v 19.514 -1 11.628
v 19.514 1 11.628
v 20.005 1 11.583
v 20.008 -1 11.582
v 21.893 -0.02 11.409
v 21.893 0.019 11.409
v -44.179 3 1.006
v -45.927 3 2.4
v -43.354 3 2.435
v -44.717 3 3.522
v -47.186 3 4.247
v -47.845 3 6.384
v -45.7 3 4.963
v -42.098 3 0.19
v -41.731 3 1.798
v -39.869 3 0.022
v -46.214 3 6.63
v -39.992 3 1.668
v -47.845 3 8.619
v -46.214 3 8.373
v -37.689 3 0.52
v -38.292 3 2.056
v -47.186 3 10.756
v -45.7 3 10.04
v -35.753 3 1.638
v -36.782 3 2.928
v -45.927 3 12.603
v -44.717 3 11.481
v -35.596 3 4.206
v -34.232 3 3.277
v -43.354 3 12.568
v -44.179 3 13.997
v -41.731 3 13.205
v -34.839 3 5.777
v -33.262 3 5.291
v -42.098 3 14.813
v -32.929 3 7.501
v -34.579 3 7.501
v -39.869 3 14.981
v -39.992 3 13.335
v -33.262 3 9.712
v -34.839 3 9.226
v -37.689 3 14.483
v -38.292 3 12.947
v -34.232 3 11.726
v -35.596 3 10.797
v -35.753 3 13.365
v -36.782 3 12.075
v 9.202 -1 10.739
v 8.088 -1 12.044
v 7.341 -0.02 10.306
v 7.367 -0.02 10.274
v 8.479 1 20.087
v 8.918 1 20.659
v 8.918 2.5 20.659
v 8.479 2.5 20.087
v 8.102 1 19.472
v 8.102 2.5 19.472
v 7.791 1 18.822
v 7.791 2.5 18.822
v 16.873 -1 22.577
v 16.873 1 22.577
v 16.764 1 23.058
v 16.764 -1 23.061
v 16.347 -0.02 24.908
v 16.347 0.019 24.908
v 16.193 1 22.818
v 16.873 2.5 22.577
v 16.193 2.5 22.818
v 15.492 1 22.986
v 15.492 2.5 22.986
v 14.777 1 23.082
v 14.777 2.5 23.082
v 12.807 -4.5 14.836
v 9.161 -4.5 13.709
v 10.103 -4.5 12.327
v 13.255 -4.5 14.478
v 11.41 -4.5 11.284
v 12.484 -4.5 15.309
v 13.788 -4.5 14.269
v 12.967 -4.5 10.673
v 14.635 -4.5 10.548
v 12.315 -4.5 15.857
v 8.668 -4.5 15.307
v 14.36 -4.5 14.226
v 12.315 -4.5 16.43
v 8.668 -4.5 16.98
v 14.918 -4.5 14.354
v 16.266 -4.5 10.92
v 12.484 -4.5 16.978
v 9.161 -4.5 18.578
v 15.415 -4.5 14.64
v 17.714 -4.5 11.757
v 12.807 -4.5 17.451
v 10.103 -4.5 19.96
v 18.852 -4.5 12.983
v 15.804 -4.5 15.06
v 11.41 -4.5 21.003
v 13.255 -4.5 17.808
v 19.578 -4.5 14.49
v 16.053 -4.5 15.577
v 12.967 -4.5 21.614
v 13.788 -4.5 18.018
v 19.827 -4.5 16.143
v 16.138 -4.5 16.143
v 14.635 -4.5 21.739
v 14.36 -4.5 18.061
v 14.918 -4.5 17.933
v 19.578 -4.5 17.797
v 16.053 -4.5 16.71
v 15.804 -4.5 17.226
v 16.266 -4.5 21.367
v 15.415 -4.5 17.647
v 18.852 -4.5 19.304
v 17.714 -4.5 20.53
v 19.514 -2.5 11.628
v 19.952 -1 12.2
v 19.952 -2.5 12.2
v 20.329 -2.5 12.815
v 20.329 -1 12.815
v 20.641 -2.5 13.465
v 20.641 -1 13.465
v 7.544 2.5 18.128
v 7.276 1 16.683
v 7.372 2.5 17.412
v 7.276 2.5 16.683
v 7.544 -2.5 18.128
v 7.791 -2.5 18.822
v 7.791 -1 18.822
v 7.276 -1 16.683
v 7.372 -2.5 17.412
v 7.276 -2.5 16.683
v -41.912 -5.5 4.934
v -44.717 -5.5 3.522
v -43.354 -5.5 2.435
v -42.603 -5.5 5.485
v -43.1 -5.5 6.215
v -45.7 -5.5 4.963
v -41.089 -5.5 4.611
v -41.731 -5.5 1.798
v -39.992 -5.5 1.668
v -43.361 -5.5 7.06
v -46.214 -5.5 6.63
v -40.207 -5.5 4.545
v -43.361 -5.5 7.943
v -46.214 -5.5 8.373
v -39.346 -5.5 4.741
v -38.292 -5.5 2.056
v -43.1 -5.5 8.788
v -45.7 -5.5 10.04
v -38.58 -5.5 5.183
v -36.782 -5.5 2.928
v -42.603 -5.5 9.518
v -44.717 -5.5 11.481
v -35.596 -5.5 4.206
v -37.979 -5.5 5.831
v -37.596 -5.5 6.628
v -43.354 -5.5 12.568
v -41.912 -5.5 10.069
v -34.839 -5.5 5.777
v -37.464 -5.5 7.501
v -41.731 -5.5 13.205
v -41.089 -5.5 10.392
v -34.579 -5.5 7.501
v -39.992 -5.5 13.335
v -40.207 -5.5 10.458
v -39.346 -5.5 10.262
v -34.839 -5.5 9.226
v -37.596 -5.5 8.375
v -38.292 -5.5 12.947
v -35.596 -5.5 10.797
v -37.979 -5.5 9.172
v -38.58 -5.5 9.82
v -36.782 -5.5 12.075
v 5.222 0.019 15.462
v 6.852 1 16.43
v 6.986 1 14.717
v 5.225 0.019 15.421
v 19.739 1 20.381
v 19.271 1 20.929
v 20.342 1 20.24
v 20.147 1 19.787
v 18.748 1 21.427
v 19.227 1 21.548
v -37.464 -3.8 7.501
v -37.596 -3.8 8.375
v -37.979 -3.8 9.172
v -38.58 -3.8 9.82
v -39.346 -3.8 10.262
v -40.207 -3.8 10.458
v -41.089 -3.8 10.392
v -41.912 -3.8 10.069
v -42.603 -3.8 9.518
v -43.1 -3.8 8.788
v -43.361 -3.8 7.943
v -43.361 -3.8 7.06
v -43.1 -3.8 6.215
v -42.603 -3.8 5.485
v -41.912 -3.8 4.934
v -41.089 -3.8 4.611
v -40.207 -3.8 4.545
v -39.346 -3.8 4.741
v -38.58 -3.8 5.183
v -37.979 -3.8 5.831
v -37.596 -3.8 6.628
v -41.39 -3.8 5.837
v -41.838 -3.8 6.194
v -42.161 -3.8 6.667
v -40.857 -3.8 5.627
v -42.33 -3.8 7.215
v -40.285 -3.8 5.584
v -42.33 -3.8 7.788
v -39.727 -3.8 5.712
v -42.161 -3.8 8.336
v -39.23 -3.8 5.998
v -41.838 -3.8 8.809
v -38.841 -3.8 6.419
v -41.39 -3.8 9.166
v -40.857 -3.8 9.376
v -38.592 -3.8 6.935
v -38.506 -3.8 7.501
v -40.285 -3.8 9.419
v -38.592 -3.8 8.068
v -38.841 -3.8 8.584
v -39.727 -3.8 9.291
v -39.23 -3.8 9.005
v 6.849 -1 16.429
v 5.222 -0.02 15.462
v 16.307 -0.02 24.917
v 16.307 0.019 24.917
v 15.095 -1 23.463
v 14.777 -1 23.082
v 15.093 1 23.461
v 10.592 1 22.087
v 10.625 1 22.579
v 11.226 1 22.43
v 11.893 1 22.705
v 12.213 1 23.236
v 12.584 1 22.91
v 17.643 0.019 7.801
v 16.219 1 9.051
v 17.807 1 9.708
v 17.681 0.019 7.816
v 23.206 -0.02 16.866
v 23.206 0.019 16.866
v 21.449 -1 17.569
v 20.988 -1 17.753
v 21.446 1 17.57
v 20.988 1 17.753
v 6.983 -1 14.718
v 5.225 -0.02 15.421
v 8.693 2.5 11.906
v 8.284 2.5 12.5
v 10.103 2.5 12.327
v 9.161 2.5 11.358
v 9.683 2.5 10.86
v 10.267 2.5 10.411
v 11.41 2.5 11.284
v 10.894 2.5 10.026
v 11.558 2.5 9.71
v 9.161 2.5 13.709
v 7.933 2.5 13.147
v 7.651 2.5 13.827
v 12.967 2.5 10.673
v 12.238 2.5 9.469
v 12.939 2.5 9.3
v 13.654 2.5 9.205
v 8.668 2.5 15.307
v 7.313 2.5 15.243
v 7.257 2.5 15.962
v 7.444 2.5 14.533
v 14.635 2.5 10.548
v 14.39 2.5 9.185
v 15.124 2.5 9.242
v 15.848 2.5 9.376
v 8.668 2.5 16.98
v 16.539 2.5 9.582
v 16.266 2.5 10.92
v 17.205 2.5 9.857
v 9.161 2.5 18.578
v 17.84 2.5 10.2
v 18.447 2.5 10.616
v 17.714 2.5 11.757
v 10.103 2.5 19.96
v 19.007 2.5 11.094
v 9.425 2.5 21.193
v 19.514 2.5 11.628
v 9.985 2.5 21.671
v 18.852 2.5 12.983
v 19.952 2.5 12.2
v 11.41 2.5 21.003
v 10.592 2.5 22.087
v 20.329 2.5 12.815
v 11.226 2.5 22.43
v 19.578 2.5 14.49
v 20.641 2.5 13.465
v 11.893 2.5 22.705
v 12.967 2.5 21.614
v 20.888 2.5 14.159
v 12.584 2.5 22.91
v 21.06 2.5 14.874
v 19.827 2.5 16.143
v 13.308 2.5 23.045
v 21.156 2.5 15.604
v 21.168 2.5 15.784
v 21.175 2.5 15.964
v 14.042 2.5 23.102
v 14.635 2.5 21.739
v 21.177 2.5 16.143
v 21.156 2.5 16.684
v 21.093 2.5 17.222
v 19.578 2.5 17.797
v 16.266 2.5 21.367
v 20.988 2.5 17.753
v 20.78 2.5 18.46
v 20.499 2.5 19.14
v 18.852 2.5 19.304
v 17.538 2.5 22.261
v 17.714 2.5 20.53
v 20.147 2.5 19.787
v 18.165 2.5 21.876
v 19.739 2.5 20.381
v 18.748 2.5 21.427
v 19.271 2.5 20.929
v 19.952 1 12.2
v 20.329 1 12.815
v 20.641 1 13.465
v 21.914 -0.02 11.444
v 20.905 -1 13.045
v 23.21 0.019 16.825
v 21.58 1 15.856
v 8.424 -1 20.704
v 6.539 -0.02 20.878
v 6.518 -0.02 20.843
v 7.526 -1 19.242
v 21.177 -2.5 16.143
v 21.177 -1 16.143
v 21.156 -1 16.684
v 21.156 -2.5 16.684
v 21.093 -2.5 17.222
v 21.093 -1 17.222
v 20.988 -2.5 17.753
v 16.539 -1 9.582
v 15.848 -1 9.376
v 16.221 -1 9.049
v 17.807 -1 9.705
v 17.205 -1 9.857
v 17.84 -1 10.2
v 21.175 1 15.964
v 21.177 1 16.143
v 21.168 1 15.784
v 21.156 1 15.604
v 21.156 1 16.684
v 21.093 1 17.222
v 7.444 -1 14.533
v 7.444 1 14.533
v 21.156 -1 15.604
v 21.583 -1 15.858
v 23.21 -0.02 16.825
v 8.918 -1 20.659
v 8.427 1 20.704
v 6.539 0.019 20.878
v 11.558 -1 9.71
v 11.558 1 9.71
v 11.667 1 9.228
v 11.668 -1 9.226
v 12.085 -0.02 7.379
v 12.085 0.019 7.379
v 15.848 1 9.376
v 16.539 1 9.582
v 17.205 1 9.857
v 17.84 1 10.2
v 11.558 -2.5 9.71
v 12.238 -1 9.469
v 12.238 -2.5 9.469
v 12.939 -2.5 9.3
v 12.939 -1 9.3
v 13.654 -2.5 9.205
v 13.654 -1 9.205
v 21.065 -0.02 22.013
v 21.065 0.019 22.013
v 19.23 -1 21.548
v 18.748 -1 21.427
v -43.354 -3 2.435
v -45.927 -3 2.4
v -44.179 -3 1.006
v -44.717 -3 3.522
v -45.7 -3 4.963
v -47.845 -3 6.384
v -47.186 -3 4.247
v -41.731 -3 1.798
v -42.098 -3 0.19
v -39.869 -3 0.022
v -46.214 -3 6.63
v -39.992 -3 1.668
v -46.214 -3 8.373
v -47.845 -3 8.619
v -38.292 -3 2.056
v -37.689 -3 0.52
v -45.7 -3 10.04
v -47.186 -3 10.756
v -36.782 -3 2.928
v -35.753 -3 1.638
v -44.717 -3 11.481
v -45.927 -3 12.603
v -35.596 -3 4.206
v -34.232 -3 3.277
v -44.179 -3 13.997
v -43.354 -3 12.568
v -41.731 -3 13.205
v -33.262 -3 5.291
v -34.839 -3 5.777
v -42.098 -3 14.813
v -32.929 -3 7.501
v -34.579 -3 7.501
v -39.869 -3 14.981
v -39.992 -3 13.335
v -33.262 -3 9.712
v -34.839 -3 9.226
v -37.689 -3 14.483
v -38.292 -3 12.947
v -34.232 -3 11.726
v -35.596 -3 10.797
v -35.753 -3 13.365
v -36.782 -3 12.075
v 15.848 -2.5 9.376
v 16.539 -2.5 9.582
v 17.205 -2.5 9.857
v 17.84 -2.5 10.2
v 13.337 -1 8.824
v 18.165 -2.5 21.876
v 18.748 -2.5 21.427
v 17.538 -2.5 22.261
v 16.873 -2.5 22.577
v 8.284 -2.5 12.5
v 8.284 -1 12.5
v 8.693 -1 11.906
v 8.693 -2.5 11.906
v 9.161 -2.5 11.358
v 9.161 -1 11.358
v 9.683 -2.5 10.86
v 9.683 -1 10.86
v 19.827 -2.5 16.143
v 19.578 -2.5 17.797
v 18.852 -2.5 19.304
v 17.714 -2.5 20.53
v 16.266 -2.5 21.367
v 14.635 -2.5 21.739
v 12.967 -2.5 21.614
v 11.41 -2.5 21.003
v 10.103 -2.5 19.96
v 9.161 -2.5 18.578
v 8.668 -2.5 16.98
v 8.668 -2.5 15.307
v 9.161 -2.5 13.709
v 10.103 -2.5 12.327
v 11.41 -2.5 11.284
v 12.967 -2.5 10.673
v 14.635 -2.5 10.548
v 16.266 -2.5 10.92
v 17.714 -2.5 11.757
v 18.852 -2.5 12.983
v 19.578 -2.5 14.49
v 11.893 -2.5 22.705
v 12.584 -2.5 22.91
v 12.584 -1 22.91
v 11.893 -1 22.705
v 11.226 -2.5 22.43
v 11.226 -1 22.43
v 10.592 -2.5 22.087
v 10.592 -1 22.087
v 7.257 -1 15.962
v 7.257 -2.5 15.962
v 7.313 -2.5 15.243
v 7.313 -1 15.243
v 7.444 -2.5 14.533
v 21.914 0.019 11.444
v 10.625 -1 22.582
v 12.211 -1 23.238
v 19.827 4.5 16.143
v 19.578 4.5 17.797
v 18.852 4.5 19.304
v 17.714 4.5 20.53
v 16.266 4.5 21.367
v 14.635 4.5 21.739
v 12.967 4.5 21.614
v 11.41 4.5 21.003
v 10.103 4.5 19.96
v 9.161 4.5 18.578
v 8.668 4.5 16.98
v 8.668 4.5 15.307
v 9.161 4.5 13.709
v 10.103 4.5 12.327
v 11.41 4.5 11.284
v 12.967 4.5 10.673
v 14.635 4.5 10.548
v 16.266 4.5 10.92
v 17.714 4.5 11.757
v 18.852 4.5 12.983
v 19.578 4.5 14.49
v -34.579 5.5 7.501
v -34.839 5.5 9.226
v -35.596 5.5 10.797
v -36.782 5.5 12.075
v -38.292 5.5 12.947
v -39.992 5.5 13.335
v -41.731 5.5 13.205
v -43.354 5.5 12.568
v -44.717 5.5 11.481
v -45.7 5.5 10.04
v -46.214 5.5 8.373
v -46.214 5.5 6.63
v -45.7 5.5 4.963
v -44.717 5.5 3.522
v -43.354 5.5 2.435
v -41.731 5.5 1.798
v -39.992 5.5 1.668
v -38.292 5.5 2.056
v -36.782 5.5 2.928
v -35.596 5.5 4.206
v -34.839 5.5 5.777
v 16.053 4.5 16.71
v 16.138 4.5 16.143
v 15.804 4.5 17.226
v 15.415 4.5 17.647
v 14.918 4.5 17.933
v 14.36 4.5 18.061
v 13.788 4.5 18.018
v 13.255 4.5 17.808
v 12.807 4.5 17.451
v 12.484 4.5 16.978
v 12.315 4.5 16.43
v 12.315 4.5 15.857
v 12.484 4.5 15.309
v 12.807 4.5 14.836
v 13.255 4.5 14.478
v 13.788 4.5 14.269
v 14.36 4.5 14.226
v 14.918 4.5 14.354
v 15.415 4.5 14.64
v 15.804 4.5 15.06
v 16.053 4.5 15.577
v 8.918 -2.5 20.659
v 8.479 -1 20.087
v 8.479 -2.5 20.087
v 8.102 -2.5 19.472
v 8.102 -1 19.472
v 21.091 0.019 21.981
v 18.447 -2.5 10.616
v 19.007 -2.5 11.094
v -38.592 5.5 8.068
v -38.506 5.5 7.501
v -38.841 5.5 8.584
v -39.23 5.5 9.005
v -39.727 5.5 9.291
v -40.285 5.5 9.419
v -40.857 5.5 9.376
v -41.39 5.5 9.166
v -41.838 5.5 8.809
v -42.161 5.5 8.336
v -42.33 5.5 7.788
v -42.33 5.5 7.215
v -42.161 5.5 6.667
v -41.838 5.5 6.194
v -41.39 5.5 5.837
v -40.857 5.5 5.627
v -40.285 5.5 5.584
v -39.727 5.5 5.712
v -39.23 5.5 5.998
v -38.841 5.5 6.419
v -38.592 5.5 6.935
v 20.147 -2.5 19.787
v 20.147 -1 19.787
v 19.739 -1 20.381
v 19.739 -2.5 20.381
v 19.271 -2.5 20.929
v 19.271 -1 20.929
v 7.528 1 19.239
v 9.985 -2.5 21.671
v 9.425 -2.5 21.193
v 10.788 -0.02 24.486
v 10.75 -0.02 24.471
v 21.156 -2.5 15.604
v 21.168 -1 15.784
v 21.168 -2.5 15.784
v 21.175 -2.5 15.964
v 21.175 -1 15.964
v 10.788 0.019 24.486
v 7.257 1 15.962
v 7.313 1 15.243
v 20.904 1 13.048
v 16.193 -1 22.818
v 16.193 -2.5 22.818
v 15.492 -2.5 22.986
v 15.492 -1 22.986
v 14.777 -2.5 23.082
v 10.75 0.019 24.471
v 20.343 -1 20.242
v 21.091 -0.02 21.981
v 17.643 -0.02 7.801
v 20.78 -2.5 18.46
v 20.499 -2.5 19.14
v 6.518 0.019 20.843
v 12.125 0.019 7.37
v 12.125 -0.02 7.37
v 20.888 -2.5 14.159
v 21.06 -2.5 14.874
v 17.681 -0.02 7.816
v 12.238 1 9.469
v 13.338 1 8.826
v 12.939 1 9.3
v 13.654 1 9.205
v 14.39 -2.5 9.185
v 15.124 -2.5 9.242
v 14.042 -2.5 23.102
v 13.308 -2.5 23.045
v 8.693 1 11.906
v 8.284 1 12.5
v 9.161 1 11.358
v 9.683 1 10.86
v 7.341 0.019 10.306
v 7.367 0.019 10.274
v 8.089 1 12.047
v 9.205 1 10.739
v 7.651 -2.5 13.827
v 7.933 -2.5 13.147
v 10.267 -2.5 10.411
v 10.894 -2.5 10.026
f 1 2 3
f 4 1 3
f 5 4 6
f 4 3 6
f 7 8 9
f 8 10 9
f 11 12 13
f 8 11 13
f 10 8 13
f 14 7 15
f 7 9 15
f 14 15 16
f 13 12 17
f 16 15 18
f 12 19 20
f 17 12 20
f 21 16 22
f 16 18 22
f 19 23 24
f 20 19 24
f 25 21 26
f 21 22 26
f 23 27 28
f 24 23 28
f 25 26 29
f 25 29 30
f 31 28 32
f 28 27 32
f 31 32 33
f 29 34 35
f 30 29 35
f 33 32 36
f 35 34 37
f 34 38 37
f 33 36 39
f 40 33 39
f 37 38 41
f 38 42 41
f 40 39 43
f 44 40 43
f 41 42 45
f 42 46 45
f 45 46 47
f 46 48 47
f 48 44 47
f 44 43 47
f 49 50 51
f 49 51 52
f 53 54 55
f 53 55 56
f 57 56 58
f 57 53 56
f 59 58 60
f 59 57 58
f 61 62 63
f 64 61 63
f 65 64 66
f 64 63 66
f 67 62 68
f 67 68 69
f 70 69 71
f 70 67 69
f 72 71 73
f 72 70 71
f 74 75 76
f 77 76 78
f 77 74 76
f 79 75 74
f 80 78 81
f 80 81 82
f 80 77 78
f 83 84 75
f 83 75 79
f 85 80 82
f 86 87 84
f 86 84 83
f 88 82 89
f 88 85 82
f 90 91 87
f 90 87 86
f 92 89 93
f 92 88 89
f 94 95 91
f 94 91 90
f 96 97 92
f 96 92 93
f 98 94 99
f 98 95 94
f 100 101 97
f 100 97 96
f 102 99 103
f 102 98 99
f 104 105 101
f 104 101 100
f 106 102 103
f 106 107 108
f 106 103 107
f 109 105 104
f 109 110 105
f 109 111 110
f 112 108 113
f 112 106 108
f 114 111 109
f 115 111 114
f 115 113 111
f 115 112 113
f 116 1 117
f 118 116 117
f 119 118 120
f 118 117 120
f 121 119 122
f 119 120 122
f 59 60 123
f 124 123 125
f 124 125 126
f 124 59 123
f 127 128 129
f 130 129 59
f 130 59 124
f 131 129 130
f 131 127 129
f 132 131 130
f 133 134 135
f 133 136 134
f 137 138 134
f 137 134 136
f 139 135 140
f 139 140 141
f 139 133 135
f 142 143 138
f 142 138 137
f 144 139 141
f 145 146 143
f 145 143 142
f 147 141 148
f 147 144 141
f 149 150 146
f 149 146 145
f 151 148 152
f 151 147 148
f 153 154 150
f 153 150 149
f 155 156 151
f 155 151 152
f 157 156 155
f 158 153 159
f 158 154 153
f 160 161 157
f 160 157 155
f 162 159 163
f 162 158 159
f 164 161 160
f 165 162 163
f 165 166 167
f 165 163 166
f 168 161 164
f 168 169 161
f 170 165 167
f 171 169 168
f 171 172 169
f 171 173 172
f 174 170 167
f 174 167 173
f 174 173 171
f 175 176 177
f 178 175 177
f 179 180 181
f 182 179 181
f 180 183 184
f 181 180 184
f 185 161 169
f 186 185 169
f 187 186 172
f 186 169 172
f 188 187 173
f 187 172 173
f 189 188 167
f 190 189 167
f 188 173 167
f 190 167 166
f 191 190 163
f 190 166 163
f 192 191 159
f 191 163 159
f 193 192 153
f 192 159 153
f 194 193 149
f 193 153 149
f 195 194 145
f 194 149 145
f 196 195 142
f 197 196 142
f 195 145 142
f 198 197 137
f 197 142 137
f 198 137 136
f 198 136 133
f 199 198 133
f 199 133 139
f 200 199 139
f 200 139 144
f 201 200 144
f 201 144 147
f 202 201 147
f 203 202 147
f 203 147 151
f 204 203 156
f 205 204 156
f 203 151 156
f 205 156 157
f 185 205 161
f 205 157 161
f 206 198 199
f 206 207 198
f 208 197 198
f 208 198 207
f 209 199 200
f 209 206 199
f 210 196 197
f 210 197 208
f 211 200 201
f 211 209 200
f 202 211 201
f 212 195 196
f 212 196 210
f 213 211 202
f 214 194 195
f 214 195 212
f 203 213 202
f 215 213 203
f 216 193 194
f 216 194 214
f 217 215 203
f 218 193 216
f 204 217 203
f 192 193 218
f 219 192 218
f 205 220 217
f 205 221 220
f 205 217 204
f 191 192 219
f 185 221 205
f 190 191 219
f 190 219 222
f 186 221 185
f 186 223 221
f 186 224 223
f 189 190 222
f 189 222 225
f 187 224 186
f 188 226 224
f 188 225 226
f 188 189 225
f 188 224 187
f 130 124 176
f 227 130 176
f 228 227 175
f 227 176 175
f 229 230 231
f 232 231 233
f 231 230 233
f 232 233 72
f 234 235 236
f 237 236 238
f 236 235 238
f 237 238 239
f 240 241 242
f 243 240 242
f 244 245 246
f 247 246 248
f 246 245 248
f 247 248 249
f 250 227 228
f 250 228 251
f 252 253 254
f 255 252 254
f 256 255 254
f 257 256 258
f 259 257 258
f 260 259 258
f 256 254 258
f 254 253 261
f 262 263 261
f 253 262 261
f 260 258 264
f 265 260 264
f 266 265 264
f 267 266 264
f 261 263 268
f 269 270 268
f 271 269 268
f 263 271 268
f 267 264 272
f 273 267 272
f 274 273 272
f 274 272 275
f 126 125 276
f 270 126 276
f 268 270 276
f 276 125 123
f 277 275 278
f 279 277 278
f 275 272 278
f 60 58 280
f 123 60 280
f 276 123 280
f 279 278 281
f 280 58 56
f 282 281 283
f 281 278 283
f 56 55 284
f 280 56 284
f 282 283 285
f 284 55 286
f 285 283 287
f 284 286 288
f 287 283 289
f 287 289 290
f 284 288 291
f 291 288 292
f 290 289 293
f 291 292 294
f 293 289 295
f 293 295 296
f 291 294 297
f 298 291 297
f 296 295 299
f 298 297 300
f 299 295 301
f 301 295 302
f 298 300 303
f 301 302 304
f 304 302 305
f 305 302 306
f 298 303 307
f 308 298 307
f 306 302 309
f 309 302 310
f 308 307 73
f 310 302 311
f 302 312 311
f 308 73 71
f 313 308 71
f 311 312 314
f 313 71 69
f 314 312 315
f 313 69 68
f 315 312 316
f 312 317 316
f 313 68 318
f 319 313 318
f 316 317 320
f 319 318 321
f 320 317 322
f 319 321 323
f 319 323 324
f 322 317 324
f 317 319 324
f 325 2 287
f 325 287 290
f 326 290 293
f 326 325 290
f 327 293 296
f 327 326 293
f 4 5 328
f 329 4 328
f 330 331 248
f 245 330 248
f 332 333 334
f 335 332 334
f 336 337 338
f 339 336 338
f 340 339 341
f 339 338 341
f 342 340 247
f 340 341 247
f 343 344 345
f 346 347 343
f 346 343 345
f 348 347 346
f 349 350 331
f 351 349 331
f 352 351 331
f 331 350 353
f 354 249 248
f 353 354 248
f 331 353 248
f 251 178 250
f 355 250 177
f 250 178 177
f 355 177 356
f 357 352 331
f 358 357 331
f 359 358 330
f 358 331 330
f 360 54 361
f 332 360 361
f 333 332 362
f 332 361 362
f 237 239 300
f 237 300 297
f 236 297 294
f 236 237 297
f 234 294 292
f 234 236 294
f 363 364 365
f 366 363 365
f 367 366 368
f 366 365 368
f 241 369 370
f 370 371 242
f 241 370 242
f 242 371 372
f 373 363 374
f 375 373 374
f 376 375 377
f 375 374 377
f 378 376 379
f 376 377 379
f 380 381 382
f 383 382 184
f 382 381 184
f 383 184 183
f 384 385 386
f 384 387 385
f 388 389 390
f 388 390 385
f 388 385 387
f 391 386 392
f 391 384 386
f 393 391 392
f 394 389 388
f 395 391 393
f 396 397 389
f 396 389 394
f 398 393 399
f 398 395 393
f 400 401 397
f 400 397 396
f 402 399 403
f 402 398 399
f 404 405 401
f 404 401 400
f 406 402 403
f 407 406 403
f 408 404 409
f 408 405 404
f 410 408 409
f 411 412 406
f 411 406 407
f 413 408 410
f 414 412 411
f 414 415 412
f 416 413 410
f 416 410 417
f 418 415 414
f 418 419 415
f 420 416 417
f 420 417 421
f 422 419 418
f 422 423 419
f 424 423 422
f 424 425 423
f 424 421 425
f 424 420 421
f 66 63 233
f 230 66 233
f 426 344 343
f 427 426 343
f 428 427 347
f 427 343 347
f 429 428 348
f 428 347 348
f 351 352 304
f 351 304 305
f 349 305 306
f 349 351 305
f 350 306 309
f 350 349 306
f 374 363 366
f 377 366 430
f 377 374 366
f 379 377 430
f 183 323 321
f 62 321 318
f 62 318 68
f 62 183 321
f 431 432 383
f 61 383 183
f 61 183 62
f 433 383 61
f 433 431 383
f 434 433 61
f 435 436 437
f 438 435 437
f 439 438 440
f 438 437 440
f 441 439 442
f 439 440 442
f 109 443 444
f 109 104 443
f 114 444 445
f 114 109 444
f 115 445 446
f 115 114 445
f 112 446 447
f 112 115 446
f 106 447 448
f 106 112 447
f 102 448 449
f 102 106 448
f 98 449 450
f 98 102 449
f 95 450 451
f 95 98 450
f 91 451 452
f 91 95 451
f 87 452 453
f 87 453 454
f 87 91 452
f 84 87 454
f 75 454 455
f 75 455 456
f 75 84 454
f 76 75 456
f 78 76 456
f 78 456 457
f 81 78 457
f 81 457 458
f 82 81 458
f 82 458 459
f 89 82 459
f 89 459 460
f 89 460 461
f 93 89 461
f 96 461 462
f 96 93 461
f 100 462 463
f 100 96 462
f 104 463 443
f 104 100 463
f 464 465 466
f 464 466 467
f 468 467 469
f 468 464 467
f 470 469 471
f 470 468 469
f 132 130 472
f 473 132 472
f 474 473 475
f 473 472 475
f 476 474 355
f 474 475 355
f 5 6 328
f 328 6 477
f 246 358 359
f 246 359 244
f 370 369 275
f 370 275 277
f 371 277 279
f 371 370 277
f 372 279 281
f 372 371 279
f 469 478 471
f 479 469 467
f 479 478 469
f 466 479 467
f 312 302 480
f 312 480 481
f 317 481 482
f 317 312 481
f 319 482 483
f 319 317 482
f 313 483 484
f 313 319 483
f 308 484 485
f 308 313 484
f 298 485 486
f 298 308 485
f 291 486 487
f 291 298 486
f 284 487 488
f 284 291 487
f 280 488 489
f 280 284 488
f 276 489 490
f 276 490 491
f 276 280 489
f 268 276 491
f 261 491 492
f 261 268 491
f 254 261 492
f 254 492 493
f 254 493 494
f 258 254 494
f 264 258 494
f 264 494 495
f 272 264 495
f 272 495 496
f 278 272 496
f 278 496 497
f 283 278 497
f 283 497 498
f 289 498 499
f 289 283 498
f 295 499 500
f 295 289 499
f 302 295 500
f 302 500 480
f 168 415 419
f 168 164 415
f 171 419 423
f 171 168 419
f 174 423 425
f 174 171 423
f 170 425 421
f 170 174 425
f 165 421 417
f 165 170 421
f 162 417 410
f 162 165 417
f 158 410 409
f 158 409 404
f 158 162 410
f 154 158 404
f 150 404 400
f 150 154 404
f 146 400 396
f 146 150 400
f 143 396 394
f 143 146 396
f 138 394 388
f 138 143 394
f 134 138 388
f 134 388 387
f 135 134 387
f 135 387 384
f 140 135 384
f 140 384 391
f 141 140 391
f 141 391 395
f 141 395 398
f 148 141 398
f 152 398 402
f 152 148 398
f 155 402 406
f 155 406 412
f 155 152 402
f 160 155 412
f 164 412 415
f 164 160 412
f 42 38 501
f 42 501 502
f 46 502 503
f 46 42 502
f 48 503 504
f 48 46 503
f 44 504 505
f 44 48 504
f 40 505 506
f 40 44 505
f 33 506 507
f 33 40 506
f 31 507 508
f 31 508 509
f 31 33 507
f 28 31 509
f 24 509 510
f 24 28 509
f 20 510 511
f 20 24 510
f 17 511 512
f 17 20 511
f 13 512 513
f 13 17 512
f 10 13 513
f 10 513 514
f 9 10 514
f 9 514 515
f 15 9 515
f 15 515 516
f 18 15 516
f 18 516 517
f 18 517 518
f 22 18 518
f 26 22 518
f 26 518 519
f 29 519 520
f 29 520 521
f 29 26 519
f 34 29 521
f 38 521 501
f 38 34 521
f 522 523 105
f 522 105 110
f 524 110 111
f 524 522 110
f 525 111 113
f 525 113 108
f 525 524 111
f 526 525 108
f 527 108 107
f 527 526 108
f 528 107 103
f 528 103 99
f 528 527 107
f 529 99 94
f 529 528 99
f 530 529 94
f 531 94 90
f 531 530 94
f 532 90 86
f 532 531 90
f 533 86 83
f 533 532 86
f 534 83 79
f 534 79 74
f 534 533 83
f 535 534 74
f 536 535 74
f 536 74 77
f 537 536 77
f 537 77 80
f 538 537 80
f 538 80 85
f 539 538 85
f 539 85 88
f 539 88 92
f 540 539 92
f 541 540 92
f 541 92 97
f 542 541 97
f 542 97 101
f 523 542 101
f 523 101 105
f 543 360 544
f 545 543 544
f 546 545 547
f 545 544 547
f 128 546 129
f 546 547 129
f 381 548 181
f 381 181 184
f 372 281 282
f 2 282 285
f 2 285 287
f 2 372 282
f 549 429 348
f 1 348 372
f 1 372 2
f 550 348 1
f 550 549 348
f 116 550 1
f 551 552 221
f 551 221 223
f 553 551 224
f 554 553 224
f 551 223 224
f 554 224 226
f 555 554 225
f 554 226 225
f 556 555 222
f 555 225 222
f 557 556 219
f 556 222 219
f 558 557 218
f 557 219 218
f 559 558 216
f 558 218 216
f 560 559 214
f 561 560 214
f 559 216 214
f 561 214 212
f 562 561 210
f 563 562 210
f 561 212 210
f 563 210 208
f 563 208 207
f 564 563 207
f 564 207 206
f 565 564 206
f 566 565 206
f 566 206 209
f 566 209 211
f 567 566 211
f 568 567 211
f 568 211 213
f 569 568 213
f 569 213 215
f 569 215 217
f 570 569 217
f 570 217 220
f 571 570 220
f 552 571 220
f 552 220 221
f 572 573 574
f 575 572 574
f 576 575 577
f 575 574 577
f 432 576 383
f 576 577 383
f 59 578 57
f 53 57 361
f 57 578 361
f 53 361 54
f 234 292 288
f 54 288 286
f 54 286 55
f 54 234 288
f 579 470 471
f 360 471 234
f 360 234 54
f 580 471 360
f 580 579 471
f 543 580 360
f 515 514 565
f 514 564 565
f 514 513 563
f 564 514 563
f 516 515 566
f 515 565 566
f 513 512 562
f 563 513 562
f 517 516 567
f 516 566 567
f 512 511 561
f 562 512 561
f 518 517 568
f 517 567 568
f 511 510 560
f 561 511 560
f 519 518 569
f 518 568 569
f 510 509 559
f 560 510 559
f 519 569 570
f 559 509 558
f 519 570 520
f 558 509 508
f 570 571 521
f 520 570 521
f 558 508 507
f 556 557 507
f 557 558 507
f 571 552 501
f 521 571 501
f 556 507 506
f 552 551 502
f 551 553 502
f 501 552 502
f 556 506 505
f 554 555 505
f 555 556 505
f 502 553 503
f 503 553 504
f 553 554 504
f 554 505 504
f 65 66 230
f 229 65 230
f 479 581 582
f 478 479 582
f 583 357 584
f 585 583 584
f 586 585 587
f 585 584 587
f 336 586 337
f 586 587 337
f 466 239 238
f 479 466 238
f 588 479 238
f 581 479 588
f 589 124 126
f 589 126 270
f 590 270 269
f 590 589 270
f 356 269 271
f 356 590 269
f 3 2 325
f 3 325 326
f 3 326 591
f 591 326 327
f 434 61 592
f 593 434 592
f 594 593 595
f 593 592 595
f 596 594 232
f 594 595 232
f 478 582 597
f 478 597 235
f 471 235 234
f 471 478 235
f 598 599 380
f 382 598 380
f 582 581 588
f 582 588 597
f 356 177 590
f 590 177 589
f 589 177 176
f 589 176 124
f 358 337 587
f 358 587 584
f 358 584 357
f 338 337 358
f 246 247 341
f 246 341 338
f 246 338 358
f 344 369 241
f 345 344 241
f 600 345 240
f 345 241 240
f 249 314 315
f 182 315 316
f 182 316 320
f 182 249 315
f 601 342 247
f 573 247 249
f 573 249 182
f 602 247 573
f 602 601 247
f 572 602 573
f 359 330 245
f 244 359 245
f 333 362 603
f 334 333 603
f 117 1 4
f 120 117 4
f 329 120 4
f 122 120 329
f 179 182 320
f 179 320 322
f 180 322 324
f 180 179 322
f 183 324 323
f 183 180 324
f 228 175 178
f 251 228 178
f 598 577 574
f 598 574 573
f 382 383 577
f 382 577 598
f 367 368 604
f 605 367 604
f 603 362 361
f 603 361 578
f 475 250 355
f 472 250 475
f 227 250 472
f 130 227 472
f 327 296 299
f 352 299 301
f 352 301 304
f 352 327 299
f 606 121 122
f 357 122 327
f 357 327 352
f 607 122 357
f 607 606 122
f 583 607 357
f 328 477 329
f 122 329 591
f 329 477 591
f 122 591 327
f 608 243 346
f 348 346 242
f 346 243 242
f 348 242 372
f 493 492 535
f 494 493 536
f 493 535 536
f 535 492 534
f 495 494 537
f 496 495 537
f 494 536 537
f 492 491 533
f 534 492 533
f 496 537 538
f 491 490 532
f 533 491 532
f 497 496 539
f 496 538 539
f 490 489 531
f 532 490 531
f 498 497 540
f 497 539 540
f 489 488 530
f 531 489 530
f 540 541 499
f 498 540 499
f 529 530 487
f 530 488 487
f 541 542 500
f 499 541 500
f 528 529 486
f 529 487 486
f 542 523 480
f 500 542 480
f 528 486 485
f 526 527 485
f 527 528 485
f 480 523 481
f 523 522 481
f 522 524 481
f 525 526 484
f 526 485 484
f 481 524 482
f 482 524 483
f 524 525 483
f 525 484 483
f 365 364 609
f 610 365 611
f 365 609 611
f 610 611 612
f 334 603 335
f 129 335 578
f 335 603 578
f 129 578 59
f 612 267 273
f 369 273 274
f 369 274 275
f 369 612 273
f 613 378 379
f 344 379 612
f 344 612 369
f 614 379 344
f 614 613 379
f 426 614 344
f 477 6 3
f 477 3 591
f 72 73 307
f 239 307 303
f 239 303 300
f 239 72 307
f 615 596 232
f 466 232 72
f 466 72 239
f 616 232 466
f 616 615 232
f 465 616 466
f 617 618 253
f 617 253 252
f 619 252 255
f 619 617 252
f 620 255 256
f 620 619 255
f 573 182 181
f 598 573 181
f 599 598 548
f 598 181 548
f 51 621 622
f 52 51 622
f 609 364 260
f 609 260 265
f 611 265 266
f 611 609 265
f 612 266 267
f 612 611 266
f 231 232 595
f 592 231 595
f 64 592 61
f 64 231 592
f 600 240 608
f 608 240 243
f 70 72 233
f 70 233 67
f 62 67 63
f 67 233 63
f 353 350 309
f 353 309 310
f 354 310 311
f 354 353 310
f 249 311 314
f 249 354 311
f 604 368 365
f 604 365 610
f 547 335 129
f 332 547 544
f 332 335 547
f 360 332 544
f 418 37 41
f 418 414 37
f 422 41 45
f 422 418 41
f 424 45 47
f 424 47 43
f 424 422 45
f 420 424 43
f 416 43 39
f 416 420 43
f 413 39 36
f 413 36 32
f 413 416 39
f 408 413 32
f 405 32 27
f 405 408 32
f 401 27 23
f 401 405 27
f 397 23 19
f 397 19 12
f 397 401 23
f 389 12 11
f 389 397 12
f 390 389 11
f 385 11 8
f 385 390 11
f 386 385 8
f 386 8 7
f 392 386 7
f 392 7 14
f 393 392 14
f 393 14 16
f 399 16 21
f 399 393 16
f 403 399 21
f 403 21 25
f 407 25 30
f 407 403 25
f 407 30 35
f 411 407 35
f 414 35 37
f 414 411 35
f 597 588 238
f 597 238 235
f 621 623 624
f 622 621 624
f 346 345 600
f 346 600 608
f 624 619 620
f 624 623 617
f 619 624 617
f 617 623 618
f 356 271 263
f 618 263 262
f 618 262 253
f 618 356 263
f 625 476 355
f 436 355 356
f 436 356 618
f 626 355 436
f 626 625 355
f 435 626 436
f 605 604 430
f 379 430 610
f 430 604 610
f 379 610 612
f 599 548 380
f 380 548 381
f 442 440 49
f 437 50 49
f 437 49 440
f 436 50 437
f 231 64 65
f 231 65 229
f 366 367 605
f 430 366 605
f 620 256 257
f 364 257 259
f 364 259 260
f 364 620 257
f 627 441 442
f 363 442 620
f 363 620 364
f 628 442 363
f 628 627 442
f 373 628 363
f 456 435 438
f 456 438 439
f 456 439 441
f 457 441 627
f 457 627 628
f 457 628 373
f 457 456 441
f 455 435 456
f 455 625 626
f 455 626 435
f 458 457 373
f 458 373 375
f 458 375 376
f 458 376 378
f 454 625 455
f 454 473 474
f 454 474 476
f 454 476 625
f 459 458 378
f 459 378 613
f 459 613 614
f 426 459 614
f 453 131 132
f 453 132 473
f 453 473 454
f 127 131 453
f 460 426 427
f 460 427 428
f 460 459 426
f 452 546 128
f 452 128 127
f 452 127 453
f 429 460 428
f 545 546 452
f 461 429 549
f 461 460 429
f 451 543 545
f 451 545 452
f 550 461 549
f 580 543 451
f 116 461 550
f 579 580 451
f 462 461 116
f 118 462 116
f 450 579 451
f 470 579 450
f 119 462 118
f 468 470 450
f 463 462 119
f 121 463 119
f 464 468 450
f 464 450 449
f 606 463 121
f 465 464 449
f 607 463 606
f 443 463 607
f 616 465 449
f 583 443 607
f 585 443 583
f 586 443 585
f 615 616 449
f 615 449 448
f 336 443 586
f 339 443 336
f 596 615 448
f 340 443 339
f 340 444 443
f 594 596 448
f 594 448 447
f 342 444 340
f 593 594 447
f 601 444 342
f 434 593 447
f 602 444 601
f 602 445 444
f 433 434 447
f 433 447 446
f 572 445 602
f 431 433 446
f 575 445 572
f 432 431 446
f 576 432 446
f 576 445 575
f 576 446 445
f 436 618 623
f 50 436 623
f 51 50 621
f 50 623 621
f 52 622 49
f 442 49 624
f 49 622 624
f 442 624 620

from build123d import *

# Parameters (mm, degrees)
F0_R         = 5.85
F1_DEPTH     = 5.5
F0_R_2       = 7.5
F2_DEPTH     = 3
F3_R         = 1.9225179896
F4_DEPTH     = 25
F3_R_2       = 2.965
F5_DEPTH     = 1.7
F6_R         = 5.61099
F6_R_2       = 1.92252
F7_DEPTH     = 2.5
F8_DEPTH     = 1
F9_DEPTH     = 4.5
F10_SIZE2    = 1.6974097914
F10_SIZE     = 0.98
F10_2_SIZE2  = 1.6974097914
F10_2_SIZE   = 0.98
F10_3_SIZE2  = 1.6974097914
F10_3_SIZE   = 0.98
F10_4_SIZE2  = 1.6974097914
F10_4_SIZE   = 0.98
F10_5_SIZE2  = 1.6974097914
F10_5_SIZE   = 0.98
F10_6_SIZE2  = 1.6974097914
F10_6_SIZE   = 0.98
F10_7_SIZE2  = 1.6974097914
F10_7_SIZE   = 0.98
F10_8_SIZE2  = 1.6974097914
F10_8_SIZE   = 0.98
F10_9_SIZE2  = 1.6974097914
F10_9_SIZE   = 0.98
F10_10_SIZE2 = 1.6974097914
F10_10_SIZE  = 0.98
F11_SIZE2    = 0.9814954576
F11_SIZE     = 1.7
F11_2_SIZE2  = 0.9814954576
F11_2_SIZE   = 1.7
F11_3_SIZE2  = 0.9814954576
F11_3_SIZE   = 1.7
F11_4_SIZE2  = 0.9814954576
F11_4_SIZE   = 1.7
F11_5_SIZE2  = 0.9814954576
F11_5_SIZE   = 1.7
F11_6_SIZE2  = 0.9814954576
F11_6_SIZE   = 1.7
F11_7_SIZE2  = 0.9814954576
F11_7_SIZE   = 1.7
F11_8_SIZE2  = 0.9814954576
F11_8_SIZE   = 1.7
F11_9_SIZE2  = 0.9814954576
F11_9_SIZE   = 1.7
F11_10_SIZE2 = 0.9814954576
F11_10_SIZE  = 1.7


with BuildPart() as f1:
    # F0 (on Front) → F1 (new body, symmetric)
    with BuildSketch(Plane.XZ):
        with Locations((-40.4290147126, 7.5014946051)):
            Circle(F0_R)
    extrude(amount=F1_DEPTH, both=True)

    # F0 (on Front) → F2 (join, symmetric)
    with BuildSketch(Plane.XZ):
        with Locations((-40.4290147126, 7.5014946051)):
            Circle(F0_R_2)
        with Locations((-40.4290147126, 7.5014946051)):
            Circle(F0_R, mode=Mode.SUBTRACT)
    extrude(amount=F2_DEPTH, both=True)

    # F3 (on face) → F4 (cut)
    with BuildSketch(Plane.XZ.offset(5.5)):
        with Locations((-40.4290147126, 7.5014946051)):
            Circle(F3_R)
    extrude(amount=-F4_DEPTH, mode=Mode.SUBTRACT)

    # F3 (on face) → F5 (cut)
    with BuildSketch(Plane.XZ.offset(5.5)):
        with Locations((-40.4290147126, 7.5014946051)):
            Circle(F3_R_2)
        with Locations((-40.4290147126, 7.5014946051)):
            Circle(F3_R, mode=Mode.SUBTRACT)
    extrude(amount=-F5_DEPTH, mode=Mode.SUBTRACT)


with BuildPart() as f7:
    # F6 (on Front) → F7 (new body, symmetric)
    with BuildSketch(Plane.XZ):
        with BuildLine():
            ThreePointArc((12.5840362785, 22.9104701209), (11.5559060371, 22.5761838649), (10.5919367916, 22.0867327559))
            Line((10.5919367916, 22.0867327559), (10.4874240314, 20.5142553084))
            Line((10.4874240314, 20.5142553084), (8.9181315816, 20.6589254406))
            ThreePointArc((8.9181315816, 20.6589254406), (8.2828452752, 19.7841623852), (7.7906699171, 18.821581214))
            ThreePointArc((7.7906699171, 18.821581214), (7.4481855965, 17.7725724525), (7.27577714, 16.6826228135))
            ThreePointArc((7.27577714, 16.6826228135), (7.275992545, 15.6015127137), (7.4436053327, 14.5334747707))
            Line((7.4436053327, 14.5334747707), (8.9068240369, 13.9481549745))
            Line((8.9068240369, 13.9481549745), (8.2842965288, 12.5003746936))
            ThreePointArc((8.2842965288, 12.5003746936), (8.9199313679, 11.625864862), (9.6833099134, 10.8603243402))
            Line((9.6833099134, 10.8603243402), (11.2111210556, 11.2468490531))
            Line((11.2111210556, 11.2468490531), (11.5584696198, 9.7096577133))
            ThreePointArc((11.5584696198, 9.7096577133), (12.5867329888, 9.3757811821), (13.654292634, 9.205148541))
            Line((13.654292634, 9.205148541), (14.6631242865, 10.4158784601))
            Line((14.6631242865, 10.4158784601), (15.8476735773, 9.3764309061))
            ThreePointArc((15.8476735773, 9.3764309061), (16.8758038187, 9.7107171621), (17.8397730642, 10.200168271))
            Line((17.8397730642, 10.200168271), (17.9442858244, 11.7726457186))
            Line((17.9442858244, 11.7726457186), (19.5135782742, 11.6279755863))
            ThreePointArc((19.5135782742, 11.6279755863), (20.1488645806, 12.5027386418), (20.6410399387, 13.465319813))
            Line((20.6410399387, 13.465319813), (19.8013134846, 14.7989118505))
            Line((19.8013134846, 14.7989118505), (21.1559327158, 15.6042782134))
            ThreePointArc((21.1559327158, 15.6042782134), (21.1716151628, 15.8736616591), (21.1768452649, 16.1434505135))
            ThreePointArc((21.1768452649, 16.1434505135), (21.1294990634, 16.9539511242), (20.9881045231, 17.7534262562))
            Line((20.9881045231, 17.7534262562), (19.5248858189, 18.3387460525))
            Line((19.5248858189, 18.3387460525), (20.147413327, 19.7865263334))
            ThreePointArc((20.147413327, 19.7865263334), (19.5117784879, 20.661036165), (18.7483999424, 21.4265766868))
            Line((18.7483999424, 21.4265766868), (17.2205888002, 21.0400519739))
            Line((17.2205888002, 21.0400519739), (16.873240236, 22.5772433137))
            ThreePointArc((16.873240236, 22.5772433137), (15.8449768669, 22.9111198449), (14.7774172217, 23.081752486))
            Line((14.7774172217, 23.081752486), (13.7685855693, 21.8710225668))
            Line((13.7685855693, 21.8710225668), (12.5840362785, 22.9104701209))
        make_face()
        with Locations((14.2158549279, 16.1434505135)):
            Circle(F6_R, mode=Mode.SUBTRACT)
        with Locations((14.2158549279, 16.1434505135)):
            Circle(F6_R)
        with Locations((14.2158549279, 16.1434505135)):
            Circle(F6_R_2, mode=Mode.SUBTRACT)
        with BuildLine():
            Line((8.9068240369, 13.9481549745), (7.4436053327, 14.5334747707))
            ThreePointArc((7.4436053327, 14.5334747707), (7.7831215765, 13.4835016227), (8.2842965288, 12.5003746936))
            Line((8.2842965288, 12.5003746936), (8.9068240369, 13.9481549745))
        make_face()
        with BuildLine():
            Line((10.4874240314, 20.5142553084), (10.5919367916, 22.0867327559))
            ThreePointArc((10.5919367916, 22.0867327559), (9.6982692764, 21.4393740735), (8.9181315816, 20.6589254406))
            Line((8.9181315816, 20.6589254406), (10.4874240314, 20.5142553084))
        make_face()
        with BuildLine():
            ThreePointArc((14.7774172217, 23.081752486), (13.6739171282, 23.0833128963), (12.5840362785, 22.9104701209))
            Line((12.5840362785, 22.9104701209), (13.7685855693, 21.8710225668))
            Line((13.7685855693, 21.8710225668), (14.7774172217, 23.081752486))
        make_face()
        with BuildLine():
            ThreePointArc((18.7483999424, 21.4265766868), (17.8565667996, 22.0764601662), (16.873240236, 22.5772433137))
            Line((16.873240236, 22.5772433137), (17.2205888002, 21.0400519739))
            Line((17.2205888002, 21.0400519739), (18.7483999424, 21.4265766868))
        make_face()
        with BuildLine():
            ThreePointArc((20.9881045231, 17.7534262562), (20.6485882793, 18.8033994043), (20.147413327, 19.7865263334))
            Line((20.147413327, 19.7865263334), (19.5248858189, 18.3387460525))
            Line((19.5248858189, 18.3387460525), (20.9881045231, 17.7534262562))
        make_face()
        with BuildLine():
            ThreePointArc((20.6410399387, 13.465319813), (20.9835242593, 14.5143285744), (21.1559327158, 15.6042782134))
            Line((21.1559327158, 15.6042782134), (19.8013134846, 14.7989118505))
            Line((19.8013134846, 14.7989118505), (20.6410399387, 13.465319813))
        make_face()
        with BuildLine():
            ThreePointArc((17.8397730642, 10.200168271), (18.7334405794, 10.8475269535), (19.5135782742, 11.6279755863))
            Line((19.5135782742, 11.6279755863), (17.9442858244, 11.7726457186))
            Line((17.9442858244, 11.7726457186), (17.8397730642, 10.200168271))
        make_face()
        with BuildLine():
            Line((14.6631242865, 10.4158784601), (13.654292634, 9.205148541))
            ThreePointArc((13.654292634, 9.205148541), (14.7577927276, 9.2035881306), (15.8476735773, 9.3764309061))
            Line((15.8476735773, 9.3764309061), (14.6631242865, 10.4158784601))
        make_face()
        with BuildLine():
            Line((11.2111210556, 11.2468490531), (9.6833099134, 10.8603243402))
            ThreePointArc((9.6833099134, 10.8603243402), (10.5751430562, 10.2104408608), (11.5584696198, 9.7096577133))
            Line((11.5584696198, 9.7096577133), (11.2111210556, 11.2468490531))
        make_face()
    extrude(amount=F7_DEPTH, both=True)

    # F6 (on Front) → F8 (join, symmetric)
    with BuildSketch(Plane.XZ):
        with BuildLine():
            ThreePointArc((7.4436053327, 14.5334747707), (7.275992545, 15.6015127137), (7.27577714, 16.6826228135))
            Line((7.27577714, 16.6826228135), (5.2221611807, 15.4616795566))
            Line((5.2221611807, 15.4616795566), (5.2253515138, 15.4208252875))
            Line((5.2253515138, 15.4208252875), (7.4436053327, 14.5334747707))
        make_face()
        with BuildLine():
            ThreePointArc((7.7906699171, 18.821581214), (8.2828452752, 19.7841623852), (8.9181315816, 20.6589254406))
            Line((8.9181315816, 20.6589254406), (6.5390689303, 20.8782467714))
            Line((6.5390689303, 20.8782467714), (6.5176364272, 20.8433197426))
            Line((6.5176364272, 20.8433197426), (7.7906699171, 18.821581214))
        make_face()
        with BuildLine():
            ThreePointArc((9.6833099134, 10.8603243402), (8.9199313679, 11.625864862), (8.2842965288, 12.5003746936))
            Line((8.2842965288, 12.5003746936), (7.3405387581, 10.3055256749))
            Line((7.3405387581, 10.3055256749), (7.3671333287, 10.2743491076))
            Line((7.3671333287, 10.2743491076), (9.6833099134, 10.8603243402))
        make_face()
        with BuildLine():
            ThreePointArc((13.654292634, 9.205148541), (12.5867329888, 9.3757811821), (11.5584696198, 9.7096577133))
            Line((11.5584696198, 9.7096577133), (12.0850534289, 7.3792606577))
            Line((12.0850534289, 7.3792606577), (12.124894015, 7.3696701814))
            Line((12.124894015, 7.3696701814), (13.654292634, 9.205148541))
        make_face()
        with BuildLine():
            ThreePointArc((17.8397730642, 10.200168271), (16.8758038187, 9.7107171621), (15.8476735773, 9.3764309061))
            Line((15.8476735773, 9.3764309061), (17.6434618491, 7.8006182816))
            Line((17.6434618491, 7.8006182816), (17.6813307008, 7.8162771321))
            Line((17.6813307008, 7.8162771321), (17.8397730642, 10.200168271))
        make_face()
        with BuildLine():
            Line((21.9140734286, 11.4435812844), (20.6410399387, 13.465319813))
            ThreePointArc((20.6410399387, 13.465319813), (20.1488645806, 12.5027386418), (19.5135782742, 11.6279755863))
            Line((19.5135782742, 11.6279755863), (21.8926409254, 11.4086542556))
            Line((21.8926409254, 11.4086542556), (21.9140734286, 11.4435812844))
        make_face()
        with BuildLine():
            Line((23.206358342, 16.8660757395), (20.9881045231, 17.7534262562))
            ThreePointArc((20.9881045231, 17.7534262562), (21.1294990634, 16.9539511242), (21.1768452649, 16.1434505135))
            ThreePointArc((21.1768452649, 16.1434505135), (21.1716151628, 15.8736616591), (21.1559327158, 15.6042782134))
            Line((21.1559327158, 15.6042782134), (23.2095486751, 16.8252214703))
            Line((23.2095486751, 16.8252214703), (23.206358342, 16.8660757395))
        make_face()
        with BuildLine():
            Line((21.0645765271, 22.0125519193), (18.7483999424, 21.4265766868))
            ThreePointArc((18.7483999424, 21.4265766868), (19.5117784879, 20.661036165), (20.147413327, 19.7865263334))
            Line((20.147413327, 19.7865263334), (21.0911710977, 21.9813753521))
            Line((21.0911710977, 21.9813753521), (21.0645765271, 22.0125519193))
        make_face()
        with BuildLine():
            Line((16.3068158408, 24.9172308456), (14.7774172217, 23.081752486))
            ThreePointArc((14.7774172217, 23.081752486), (15.8449768669, 22.9111198449), (16.873240236, 22.5772433137))
            Line((16.873240236, 22.5772433137), (16.3466564269, 24.9076403692))
            Line((16.3466564269, 24.9076403692), (16.3068158408, 24.9172308456))
        make_face()
        with BuildLine():
            Line((10.7882480067, 24.4862827454), (10.750379155, 24.4706238948))
            Line((10.750379155, 24.4706238948), (10.5919367916, 22.0867327559))
            ThreePointArc((10.5919367916, 22.0867327559), (11.5559060371, 22.5761838649), (12.5840362785, 22.9104701209))
            Line((12.5840362785, 22.9104701209), (10.7882480067, 24.4862827454))
        make_face()
    extrude(amount=F8_DEPTH, both=True)

    # F6 (on Front) → F9 (join, symmetric)
    with BuildSketch(Plane.XZ):
        with Locations((14.2158549279, 16.1434505135)):
            Circle(F6_R)
        with Locations((14.2158549279, 16.1434505135)):
            Circle(F6_R_2, mode=Mode.SUBTRACT)
    extrude(amount=F9_DEPTH, both=True)

    # F10
    f10_edges = [f7.edges().sort_by_distance(p)[0] for p in [
        (21.903357, -1, 11.426118),
    ]]
    f10_side = f7.faces().sort_by_distance((21.903357, 0, 11.426118))[0]
    chamfer(f10_edges, length=F10_SIZE, length2=F10_SIZE2, reference=f10_side)

    # F10#2
    f10_2_edges = [f7.edges().sort_by_distance(p)[0] for p in [
        (17.662396, -1, 7.808448),
    ]]
    f10_2_side = f7.faces().sort_by_distance((17.662396, 0, 7.808448))[0]
    chamfer(f10_2_edges, length=F10_2_SIZE, length2=F10_2_SIZE2, reference=f10_2_side)

    # F10#3
    f10_3_edges = [f7.edges().sort_by_distance(p)[0] for p in [
        (12.104974, -1, 7.374465),
    ]]
    f10_3_side = f7.faces().sort_by_distance((12.104974, 0, 7.374465))[0]
    chamfer(f10_3_edges, length=F10_3_SIZE, length2=F10_3_SIZE2, reference=f10_3_side)

    # F10#4
    f10_4_edges = [f7.edges().sort_by_distance(p)[0] for p in [
        (7.353836, -1, 10.289937),
    ]]
    f10_4_side = f7.faces().sort_by_distance((7.353836, 0, 10.289937))[0]
    chamfer(f10_4_edges, length=F10_4_SIZE, length2=F10_4_SIZE2, reference=f10_4_side)

    # F10#5
    f10_5_edges = [f7.edges().sort_by_distance(p)[0] for p in [
        (5.223756, -1, 15.441252),
    ]]
    f10_5_side = f7.faces().sort_by_distance((5.223756, 0, 15.441252))[0]
    chamfer(f10_5_edges, length=F10_5_SIZE, length2=F10_5_SIZE2, reference=f10_5_side)

    # F10#6
    f10_6_edges = [f7.edges().sort_by_distance(p)[0] for p in [
        (6.528353, -1, 20.860783),
    ]]
    f10_6_side = f7.faces().sort_by_distance((6.528353, 0, 20.860783))[0]
    chamfer(f10_6_edges, length=F10_6_SIZE, length2=F10_6_SIZE2, reference=f10_6_side)

    # F10#7
    f10_7_edges = [f7.edges().sort_by_distance(p)[0] for p in [
        (10.769314, -1, 24.478453),
    ]]
    f10_7_side = f7.faces().sort_by_distance((10.769314, 0, 24.478453))[0]
    chamfer(f10_7_edges, length=F10_7_SIZE, length2=F10_7_SIZE2, reference=f10_7_side)

    # F10#8
    f10_8_edges = [f7.edges().sort_by_distance(p)[0] for p in [
        (16.326736, -1, 24.912436),
    ]]
    f10_8_side = f7.faces().sort_by_distance((16.326736, 0, 24.912436))[0]
    chamfer(f10_8_edges, length=F10_8_SIZE, length2=F10_8_SIZE2, reference=f10_8_side)

    # F10#9
    f10_9_edges = [f7.edges().sort_by_distance(p)[0] for p in [
        (21.077874, -1, 21.996964),
    ]]
    f10_9_side = f7.faces().sort_by_distance((21.077874, 0, 21.996964))[0]
    chamfer(f10_9_edges, length=F10_9_SIZE, length2=F10_9_SIZE2, reference=f10_9_side)

    # F10#10
    f10_10_edges = [f7.edges().sort_by_distance(p)[0] for p in [
        (23.207954, -1, 16.845649),
    ]]
    f10_10_side = f7.faces().sort_by_distance((23.207954, 0, 16.845649))[0]
    chamfer(f10_10_edges, length=F10_10_SIZE, length2=F10_10_SIZE2, reference=f10_10_side)

    # F11
    f11_edges = [f7.edges().sort_by_distance(p)[0] for p in [
        (21.903357, 1, 11.426118),
    ]]
    f11_side = f7.faces().sort_by_distance((20.729349, 1, 12.146532))[0]
    chamfer(f11_edges, length=F11_SIZE, length2=F11_SIZE2, reference=f11_side)

    # F11#2
    f11_2_edges = [f7.edges().sort_by_distance(p)[0] for p in [
        (23.207954, 1, 16.845649),
    ]]
    f11_2_side = f7.faces().sort_by_distance((21.834712, 1, 16.738411))[0]
    chamfer(f11_2_edges, length=F11_2_SIZE, length2=F11_2_SIZE2, reference=f11_2_side)

    # F11#3
    f11_3_edges = [f7.edges().sort_by_distance(p)[0] for p in [
        (21.077874, 1, 21.996964),
    ]]
    f11_3_side = f7.faces().sort_by_distance((20.029931, 1, 21.103036))[0]
    chamfer(f11_3_edges, length=F11_3_SIZE, length2=F11_3_SIZE2, reference=f11_3_side)

    # F11#4
    f11_4_edges = [f7.edges().sort_by_distance(p)[0] for p in [
        (16.326736, 1, 24.912436),
    ]]
    f11_4_side = f7.faces().sort_by_distance((16.00437, 1, 23.573268))[0]
    chamfer(f11_4_edges, length=F11_4_SIZE, length2=F11_4_SIZE2, reference=f11_4_side)

    # F11#5
    f11_5_edges = [f7.edges().sort_by_distance(p)[0] for p in [
        (10.769314, 1, 24.478453),
    ]]
    f11_5_side = f7.faces().sort_by_distance((11.295657, 1, 23.205562))[0]
    chamfer(f11_5_edges, length=F11_5_SIZE, length2=F11_5_SIZE2, reference=f11_5_side)

    # F11#6
    f11_6_edges = [f7.edges().sort_by_distance(p)[0] for p in [
        (6.528353, 1, 20.860783),
    ]]
    f11_6_side = f7.faces().sort_by_distance((7.70236, 1, 20.140369))[0]
    chamfer(f11_6_edges, length=F11_6_SIZE, length2=F11_6_SIZE2, reference=f11_6_side)

    # F11#7
    f11_7_edges = [f7.edges().sort_by_distance(p)[0] for p in [
        (5.223756, 1, 15.441252),
    ]]
    f11_7_side = f7.faces().sort_by_distance((6.596997, 1, 15.54849))[0]
    chamfer(f11_7_edges, length=F11_7_SIZE, length2=F11_7_SIZE2, reference=f11_7_side)

    # F11#8
    f11_8_edges = [f7.edges().sort_by_distance(p)[0] for p in [
        (7.353836, 1, 10.289937),
    ]]
    f11_8_side = f7.faces().sort_by_distance((8.401779, 1, 11.183865))[0]
    chamfer(f11_8_edges, length=F11_8_SIZE, length2=F11_8_SIZE2, reference=f11_8_side)

    # F11#9
    f11_9_edges = [f7.edges().sort_by_distance(p)[0] for p in [
        (12.104974, 1, 7.374465),
    ]]
    f11_9_side = f7.faces().sort_by_distance((12.42734, 1, 8.713633))[0]
    chamfer(f11_9_edges, length=F11_9_SIZE, length2=F11_9_SIZE2, reference=f11_9_side)

    # F11#10
    f11_10_edges = [f7.edges().sort_by_distance(p)[0] for p in [
        (17.662396, 1, 7.808448),
    ]]
    f11_10_side = f7.faces().sort_by_distance((17.136053, 1, 9.081339))[0]
    chamfer(f11_10_edges, length=F11_10_SIZE, length2=F11_10_SIZE2, reference=f11_10_side)


solid = Compound([f1.part, f7.part])
